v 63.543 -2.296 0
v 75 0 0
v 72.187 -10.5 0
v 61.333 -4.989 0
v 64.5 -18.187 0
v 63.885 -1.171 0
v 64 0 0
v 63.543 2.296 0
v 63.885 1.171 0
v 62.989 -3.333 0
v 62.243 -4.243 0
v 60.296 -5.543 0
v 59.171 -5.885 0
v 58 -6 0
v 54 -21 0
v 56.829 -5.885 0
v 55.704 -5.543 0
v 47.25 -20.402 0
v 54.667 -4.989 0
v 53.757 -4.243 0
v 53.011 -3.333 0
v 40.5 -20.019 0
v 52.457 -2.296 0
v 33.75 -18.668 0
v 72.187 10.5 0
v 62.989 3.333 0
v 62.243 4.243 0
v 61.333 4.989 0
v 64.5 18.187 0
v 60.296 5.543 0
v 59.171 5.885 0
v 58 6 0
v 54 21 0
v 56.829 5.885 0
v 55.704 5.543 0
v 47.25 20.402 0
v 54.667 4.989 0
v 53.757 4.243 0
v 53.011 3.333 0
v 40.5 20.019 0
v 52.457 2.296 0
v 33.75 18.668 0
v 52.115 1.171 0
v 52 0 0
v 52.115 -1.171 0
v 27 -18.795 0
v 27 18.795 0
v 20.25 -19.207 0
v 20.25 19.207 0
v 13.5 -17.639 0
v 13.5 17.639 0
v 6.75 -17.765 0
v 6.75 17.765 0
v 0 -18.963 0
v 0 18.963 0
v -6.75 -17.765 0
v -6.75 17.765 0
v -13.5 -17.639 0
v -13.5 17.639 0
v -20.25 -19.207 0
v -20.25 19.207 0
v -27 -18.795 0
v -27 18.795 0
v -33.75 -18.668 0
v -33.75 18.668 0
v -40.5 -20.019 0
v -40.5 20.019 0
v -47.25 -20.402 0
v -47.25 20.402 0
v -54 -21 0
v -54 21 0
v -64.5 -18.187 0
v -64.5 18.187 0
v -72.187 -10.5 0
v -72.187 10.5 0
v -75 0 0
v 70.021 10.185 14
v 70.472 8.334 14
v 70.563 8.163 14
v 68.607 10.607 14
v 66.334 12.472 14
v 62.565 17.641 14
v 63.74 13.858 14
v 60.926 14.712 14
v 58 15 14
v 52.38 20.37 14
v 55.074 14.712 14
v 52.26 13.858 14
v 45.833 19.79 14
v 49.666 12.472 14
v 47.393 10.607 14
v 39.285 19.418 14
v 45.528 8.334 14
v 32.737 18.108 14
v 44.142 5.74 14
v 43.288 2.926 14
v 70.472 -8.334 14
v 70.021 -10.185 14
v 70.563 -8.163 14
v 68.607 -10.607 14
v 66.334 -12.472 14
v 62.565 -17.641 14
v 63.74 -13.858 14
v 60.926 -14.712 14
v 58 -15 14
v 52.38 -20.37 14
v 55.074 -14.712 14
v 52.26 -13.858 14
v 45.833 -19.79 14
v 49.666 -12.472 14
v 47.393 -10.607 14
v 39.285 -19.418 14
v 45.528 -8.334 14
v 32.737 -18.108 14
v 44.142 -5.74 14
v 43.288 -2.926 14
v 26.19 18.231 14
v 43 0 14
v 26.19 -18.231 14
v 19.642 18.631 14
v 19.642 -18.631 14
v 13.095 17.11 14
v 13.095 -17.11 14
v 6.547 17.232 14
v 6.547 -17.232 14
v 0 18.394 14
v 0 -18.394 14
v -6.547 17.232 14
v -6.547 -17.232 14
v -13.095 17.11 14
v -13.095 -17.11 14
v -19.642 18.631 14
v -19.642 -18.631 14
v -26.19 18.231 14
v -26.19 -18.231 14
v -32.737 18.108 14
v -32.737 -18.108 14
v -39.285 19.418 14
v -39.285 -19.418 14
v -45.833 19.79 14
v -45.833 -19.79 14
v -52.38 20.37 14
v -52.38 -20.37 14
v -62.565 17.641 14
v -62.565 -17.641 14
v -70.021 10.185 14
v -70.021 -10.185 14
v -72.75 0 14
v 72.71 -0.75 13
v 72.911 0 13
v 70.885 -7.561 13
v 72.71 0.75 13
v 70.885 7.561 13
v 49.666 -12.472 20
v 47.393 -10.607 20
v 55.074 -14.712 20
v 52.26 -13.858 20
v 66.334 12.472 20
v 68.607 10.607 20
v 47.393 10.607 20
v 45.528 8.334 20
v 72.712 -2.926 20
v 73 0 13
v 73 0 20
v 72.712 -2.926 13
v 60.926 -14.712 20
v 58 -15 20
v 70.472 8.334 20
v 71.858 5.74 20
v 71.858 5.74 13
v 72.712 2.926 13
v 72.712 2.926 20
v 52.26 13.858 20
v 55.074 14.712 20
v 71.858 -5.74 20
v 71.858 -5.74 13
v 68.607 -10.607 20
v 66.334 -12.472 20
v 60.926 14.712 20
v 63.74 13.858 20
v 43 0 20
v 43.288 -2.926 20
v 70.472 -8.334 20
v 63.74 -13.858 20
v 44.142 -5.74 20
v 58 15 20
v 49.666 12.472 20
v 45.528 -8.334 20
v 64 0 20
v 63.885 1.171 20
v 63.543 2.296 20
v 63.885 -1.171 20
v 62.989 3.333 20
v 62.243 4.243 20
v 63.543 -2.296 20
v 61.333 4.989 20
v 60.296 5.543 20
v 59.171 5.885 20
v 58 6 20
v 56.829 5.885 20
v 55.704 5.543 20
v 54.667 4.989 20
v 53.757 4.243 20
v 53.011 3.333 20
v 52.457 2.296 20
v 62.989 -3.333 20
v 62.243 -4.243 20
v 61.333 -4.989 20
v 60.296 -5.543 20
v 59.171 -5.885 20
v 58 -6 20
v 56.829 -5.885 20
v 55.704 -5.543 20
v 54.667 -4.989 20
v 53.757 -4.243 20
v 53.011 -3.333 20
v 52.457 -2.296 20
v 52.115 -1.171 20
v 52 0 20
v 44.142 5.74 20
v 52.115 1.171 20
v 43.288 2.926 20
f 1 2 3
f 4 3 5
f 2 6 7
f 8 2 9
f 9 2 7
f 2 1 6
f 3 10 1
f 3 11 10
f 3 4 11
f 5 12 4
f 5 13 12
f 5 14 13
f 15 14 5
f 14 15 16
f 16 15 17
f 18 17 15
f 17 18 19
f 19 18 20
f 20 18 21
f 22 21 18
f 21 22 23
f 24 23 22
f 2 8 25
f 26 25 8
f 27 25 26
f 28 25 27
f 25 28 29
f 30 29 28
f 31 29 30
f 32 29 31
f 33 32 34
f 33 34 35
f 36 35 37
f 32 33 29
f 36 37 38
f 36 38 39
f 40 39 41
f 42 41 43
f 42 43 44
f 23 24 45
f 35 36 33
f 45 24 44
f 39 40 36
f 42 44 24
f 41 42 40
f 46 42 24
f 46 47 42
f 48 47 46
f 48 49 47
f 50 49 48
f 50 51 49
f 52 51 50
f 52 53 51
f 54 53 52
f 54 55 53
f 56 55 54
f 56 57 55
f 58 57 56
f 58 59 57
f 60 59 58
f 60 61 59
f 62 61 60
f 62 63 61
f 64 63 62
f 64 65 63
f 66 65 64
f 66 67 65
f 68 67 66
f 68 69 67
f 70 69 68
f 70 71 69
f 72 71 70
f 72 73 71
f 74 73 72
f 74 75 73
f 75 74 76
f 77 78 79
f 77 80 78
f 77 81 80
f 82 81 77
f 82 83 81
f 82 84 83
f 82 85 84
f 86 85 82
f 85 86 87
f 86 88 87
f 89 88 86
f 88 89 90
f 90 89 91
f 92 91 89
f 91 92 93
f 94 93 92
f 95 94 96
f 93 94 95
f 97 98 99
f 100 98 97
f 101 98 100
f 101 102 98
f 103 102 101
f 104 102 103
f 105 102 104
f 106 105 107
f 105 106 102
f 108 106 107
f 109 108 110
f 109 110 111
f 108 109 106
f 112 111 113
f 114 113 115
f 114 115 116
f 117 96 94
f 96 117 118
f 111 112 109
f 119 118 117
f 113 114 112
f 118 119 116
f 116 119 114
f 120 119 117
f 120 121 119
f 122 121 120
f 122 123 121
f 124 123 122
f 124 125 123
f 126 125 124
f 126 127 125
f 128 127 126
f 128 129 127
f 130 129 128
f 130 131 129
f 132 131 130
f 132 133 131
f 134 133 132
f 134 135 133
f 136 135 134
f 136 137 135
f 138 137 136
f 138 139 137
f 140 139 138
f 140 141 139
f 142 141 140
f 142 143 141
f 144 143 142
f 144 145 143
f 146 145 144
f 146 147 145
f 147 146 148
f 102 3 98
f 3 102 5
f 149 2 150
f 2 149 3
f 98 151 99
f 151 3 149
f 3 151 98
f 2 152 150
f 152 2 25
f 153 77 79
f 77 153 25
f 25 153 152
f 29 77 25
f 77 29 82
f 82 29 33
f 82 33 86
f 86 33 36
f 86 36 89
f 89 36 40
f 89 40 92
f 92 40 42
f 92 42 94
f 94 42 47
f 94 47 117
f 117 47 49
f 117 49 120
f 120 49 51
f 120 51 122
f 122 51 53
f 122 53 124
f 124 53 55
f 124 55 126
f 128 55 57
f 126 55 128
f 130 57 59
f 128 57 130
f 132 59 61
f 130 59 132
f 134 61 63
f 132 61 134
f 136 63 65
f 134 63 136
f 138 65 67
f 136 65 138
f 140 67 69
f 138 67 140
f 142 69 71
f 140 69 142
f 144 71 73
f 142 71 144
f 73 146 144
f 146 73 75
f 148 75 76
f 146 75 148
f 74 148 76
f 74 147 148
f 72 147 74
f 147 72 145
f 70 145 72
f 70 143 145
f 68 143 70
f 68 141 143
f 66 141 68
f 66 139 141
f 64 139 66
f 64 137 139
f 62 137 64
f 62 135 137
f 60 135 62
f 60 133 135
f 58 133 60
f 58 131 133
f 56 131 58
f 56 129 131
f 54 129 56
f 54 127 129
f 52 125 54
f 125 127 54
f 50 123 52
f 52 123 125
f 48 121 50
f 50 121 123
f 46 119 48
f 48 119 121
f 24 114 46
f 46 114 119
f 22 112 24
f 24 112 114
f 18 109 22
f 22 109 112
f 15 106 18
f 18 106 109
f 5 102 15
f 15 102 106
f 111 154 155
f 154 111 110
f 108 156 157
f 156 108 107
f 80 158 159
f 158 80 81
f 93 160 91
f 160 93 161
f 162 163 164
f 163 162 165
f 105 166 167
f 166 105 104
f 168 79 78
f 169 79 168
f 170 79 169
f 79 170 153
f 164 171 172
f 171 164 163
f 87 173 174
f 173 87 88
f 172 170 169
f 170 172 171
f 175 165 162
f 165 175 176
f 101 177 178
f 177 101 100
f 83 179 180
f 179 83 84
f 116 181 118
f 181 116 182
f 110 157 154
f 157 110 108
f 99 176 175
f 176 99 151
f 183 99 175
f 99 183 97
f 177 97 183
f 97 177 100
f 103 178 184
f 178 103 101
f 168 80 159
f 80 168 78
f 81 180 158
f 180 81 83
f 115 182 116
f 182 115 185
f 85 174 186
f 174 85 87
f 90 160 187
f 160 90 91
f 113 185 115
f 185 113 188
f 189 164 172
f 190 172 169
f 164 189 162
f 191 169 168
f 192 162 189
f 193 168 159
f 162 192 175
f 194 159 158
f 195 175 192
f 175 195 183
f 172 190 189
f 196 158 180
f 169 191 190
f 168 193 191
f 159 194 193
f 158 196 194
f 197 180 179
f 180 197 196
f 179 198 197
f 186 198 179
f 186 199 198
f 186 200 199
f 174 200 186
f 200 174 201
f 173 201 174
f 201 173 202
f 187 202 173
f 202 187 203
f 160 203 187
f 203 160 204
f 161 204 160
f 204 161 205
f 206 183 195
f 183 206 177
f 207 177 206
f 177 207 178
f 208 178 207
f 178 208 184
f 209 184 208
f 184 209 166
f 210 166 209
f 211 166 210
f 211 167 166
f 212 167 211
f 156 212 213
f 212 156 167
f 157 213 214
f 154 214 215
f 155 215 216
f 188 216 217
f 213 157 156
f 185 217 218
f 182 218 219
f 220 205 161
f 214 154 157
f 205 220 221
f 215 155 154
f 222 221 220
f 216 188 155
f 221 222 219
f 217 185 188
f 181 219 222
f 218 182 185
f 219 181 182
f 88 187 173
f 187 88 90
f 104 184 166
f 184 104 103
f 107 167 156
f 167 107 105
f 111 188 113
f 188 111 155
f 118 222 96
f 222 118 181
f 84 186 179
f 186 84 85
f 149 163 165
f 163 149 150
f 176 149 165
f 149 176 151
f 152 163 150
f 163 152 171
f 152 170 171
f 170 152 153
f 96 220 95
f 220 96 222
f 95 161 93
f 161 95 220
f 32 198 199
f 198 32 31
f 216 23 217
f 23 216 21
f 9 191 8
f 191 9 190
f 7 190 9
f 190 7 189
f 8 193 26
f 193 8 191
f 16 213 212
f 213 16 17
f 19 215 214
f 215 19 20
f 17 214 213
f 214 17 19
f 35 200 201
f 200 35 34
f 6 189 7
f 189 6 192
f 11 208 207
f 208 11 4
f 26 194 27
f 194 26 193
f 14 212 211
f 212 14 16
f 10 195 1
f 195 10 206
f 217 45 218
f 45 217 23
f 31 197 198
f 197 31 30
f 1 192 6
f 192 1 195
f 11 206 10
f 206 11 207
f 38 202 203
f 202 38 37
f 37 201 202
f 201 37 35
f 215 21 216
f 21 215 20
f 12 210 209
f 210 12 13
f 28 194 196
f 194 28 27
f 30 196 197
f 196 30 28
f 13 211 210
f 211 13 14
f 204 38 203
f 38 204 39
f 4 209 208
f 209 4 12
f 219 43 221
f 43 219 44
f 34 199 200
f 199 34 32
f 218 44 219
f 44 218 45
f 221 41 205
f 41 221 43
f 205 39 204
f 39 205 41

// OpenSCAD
$fn = 32;

// ----------------------------------------------------------------------
// Handle: 150 x 42 mm grip, 14 mm thick
// ----------------------------------------------------------------------

// --- parameters (mm) ---
length = 150;             // grip length
width = 42;               // grip width
thickness = 14;           // grip thickness
waist = 0.86;             // width factor at the middle
draft = 0.97;             // top face scale of the extrusion
scallops = 5;             // finger rests per side
ripple = 0.05;            // depth factor of the finger rests
boss_d = 30;              // mounting boss diameter
boss_h = 6;               // mounting boss height
boss_hole_d = 12;         // screw clearance through the boss
boss_r = 58;              // boss centre from the grip centre

/* ergonomic grip outline, closed spline-like polygon in the XY plane */
grip = [[-54, 21], [-47.25, 20.402], [-40.5, 20.019], [-33.75, 18.668], [-27, 18.795], [-20.25, 19.207], [-13.5, 17.639], [-6.75, 17.765], [0, 18.963], [6.75, 17.765], [13.5, 17.639], [20.25, 19.207], [27, 18.795], [33.75, 18.668], [40.5, 20.019], [47.25, 20.402], [54, 21], [64.5, 18.187], [72.187, 10.5], [75, 0], [72.187, -10.5], [64.5, -18.187], [54, -21], [54, -21], [47.25, -20.402], [40.5, -20.019], [33.75, -18.668], [27, -18.795], [20.25, -19.207], [13.5, -17.639], [6.75, -17.765], [0, -18.963], [-6.75, -17.765], [-13.5, -17.639], [-20.25, -19.207], [-27, -18.795], [-33.75, -18.668], [-40.5, -20.019], [-47.25, -20.402], [-54, -21], [-64.5, -18.187], [-72.187, -10.5], [-75, 0], [-72.187, 10.5], [-64.5, 18.187], [-54, 21]];

module grip_body() {
  linear_extrude(height = thickness, scale = draft) polygon(grip);
}

module boss_body() {
  /* sunk 1 mm into the grip so the joint overlaps */
  translate([boss_r, 0, thickness - 1]) cylinder(h = boss_h + 1, d = boss_d);
}

difference() {
  union() {
    grip_body();
    boss_body();
  }
  translate([boss_r, 0, -1]) cylinder(h = thickness + boss_h + 2, d = boss_hole_d);
}
